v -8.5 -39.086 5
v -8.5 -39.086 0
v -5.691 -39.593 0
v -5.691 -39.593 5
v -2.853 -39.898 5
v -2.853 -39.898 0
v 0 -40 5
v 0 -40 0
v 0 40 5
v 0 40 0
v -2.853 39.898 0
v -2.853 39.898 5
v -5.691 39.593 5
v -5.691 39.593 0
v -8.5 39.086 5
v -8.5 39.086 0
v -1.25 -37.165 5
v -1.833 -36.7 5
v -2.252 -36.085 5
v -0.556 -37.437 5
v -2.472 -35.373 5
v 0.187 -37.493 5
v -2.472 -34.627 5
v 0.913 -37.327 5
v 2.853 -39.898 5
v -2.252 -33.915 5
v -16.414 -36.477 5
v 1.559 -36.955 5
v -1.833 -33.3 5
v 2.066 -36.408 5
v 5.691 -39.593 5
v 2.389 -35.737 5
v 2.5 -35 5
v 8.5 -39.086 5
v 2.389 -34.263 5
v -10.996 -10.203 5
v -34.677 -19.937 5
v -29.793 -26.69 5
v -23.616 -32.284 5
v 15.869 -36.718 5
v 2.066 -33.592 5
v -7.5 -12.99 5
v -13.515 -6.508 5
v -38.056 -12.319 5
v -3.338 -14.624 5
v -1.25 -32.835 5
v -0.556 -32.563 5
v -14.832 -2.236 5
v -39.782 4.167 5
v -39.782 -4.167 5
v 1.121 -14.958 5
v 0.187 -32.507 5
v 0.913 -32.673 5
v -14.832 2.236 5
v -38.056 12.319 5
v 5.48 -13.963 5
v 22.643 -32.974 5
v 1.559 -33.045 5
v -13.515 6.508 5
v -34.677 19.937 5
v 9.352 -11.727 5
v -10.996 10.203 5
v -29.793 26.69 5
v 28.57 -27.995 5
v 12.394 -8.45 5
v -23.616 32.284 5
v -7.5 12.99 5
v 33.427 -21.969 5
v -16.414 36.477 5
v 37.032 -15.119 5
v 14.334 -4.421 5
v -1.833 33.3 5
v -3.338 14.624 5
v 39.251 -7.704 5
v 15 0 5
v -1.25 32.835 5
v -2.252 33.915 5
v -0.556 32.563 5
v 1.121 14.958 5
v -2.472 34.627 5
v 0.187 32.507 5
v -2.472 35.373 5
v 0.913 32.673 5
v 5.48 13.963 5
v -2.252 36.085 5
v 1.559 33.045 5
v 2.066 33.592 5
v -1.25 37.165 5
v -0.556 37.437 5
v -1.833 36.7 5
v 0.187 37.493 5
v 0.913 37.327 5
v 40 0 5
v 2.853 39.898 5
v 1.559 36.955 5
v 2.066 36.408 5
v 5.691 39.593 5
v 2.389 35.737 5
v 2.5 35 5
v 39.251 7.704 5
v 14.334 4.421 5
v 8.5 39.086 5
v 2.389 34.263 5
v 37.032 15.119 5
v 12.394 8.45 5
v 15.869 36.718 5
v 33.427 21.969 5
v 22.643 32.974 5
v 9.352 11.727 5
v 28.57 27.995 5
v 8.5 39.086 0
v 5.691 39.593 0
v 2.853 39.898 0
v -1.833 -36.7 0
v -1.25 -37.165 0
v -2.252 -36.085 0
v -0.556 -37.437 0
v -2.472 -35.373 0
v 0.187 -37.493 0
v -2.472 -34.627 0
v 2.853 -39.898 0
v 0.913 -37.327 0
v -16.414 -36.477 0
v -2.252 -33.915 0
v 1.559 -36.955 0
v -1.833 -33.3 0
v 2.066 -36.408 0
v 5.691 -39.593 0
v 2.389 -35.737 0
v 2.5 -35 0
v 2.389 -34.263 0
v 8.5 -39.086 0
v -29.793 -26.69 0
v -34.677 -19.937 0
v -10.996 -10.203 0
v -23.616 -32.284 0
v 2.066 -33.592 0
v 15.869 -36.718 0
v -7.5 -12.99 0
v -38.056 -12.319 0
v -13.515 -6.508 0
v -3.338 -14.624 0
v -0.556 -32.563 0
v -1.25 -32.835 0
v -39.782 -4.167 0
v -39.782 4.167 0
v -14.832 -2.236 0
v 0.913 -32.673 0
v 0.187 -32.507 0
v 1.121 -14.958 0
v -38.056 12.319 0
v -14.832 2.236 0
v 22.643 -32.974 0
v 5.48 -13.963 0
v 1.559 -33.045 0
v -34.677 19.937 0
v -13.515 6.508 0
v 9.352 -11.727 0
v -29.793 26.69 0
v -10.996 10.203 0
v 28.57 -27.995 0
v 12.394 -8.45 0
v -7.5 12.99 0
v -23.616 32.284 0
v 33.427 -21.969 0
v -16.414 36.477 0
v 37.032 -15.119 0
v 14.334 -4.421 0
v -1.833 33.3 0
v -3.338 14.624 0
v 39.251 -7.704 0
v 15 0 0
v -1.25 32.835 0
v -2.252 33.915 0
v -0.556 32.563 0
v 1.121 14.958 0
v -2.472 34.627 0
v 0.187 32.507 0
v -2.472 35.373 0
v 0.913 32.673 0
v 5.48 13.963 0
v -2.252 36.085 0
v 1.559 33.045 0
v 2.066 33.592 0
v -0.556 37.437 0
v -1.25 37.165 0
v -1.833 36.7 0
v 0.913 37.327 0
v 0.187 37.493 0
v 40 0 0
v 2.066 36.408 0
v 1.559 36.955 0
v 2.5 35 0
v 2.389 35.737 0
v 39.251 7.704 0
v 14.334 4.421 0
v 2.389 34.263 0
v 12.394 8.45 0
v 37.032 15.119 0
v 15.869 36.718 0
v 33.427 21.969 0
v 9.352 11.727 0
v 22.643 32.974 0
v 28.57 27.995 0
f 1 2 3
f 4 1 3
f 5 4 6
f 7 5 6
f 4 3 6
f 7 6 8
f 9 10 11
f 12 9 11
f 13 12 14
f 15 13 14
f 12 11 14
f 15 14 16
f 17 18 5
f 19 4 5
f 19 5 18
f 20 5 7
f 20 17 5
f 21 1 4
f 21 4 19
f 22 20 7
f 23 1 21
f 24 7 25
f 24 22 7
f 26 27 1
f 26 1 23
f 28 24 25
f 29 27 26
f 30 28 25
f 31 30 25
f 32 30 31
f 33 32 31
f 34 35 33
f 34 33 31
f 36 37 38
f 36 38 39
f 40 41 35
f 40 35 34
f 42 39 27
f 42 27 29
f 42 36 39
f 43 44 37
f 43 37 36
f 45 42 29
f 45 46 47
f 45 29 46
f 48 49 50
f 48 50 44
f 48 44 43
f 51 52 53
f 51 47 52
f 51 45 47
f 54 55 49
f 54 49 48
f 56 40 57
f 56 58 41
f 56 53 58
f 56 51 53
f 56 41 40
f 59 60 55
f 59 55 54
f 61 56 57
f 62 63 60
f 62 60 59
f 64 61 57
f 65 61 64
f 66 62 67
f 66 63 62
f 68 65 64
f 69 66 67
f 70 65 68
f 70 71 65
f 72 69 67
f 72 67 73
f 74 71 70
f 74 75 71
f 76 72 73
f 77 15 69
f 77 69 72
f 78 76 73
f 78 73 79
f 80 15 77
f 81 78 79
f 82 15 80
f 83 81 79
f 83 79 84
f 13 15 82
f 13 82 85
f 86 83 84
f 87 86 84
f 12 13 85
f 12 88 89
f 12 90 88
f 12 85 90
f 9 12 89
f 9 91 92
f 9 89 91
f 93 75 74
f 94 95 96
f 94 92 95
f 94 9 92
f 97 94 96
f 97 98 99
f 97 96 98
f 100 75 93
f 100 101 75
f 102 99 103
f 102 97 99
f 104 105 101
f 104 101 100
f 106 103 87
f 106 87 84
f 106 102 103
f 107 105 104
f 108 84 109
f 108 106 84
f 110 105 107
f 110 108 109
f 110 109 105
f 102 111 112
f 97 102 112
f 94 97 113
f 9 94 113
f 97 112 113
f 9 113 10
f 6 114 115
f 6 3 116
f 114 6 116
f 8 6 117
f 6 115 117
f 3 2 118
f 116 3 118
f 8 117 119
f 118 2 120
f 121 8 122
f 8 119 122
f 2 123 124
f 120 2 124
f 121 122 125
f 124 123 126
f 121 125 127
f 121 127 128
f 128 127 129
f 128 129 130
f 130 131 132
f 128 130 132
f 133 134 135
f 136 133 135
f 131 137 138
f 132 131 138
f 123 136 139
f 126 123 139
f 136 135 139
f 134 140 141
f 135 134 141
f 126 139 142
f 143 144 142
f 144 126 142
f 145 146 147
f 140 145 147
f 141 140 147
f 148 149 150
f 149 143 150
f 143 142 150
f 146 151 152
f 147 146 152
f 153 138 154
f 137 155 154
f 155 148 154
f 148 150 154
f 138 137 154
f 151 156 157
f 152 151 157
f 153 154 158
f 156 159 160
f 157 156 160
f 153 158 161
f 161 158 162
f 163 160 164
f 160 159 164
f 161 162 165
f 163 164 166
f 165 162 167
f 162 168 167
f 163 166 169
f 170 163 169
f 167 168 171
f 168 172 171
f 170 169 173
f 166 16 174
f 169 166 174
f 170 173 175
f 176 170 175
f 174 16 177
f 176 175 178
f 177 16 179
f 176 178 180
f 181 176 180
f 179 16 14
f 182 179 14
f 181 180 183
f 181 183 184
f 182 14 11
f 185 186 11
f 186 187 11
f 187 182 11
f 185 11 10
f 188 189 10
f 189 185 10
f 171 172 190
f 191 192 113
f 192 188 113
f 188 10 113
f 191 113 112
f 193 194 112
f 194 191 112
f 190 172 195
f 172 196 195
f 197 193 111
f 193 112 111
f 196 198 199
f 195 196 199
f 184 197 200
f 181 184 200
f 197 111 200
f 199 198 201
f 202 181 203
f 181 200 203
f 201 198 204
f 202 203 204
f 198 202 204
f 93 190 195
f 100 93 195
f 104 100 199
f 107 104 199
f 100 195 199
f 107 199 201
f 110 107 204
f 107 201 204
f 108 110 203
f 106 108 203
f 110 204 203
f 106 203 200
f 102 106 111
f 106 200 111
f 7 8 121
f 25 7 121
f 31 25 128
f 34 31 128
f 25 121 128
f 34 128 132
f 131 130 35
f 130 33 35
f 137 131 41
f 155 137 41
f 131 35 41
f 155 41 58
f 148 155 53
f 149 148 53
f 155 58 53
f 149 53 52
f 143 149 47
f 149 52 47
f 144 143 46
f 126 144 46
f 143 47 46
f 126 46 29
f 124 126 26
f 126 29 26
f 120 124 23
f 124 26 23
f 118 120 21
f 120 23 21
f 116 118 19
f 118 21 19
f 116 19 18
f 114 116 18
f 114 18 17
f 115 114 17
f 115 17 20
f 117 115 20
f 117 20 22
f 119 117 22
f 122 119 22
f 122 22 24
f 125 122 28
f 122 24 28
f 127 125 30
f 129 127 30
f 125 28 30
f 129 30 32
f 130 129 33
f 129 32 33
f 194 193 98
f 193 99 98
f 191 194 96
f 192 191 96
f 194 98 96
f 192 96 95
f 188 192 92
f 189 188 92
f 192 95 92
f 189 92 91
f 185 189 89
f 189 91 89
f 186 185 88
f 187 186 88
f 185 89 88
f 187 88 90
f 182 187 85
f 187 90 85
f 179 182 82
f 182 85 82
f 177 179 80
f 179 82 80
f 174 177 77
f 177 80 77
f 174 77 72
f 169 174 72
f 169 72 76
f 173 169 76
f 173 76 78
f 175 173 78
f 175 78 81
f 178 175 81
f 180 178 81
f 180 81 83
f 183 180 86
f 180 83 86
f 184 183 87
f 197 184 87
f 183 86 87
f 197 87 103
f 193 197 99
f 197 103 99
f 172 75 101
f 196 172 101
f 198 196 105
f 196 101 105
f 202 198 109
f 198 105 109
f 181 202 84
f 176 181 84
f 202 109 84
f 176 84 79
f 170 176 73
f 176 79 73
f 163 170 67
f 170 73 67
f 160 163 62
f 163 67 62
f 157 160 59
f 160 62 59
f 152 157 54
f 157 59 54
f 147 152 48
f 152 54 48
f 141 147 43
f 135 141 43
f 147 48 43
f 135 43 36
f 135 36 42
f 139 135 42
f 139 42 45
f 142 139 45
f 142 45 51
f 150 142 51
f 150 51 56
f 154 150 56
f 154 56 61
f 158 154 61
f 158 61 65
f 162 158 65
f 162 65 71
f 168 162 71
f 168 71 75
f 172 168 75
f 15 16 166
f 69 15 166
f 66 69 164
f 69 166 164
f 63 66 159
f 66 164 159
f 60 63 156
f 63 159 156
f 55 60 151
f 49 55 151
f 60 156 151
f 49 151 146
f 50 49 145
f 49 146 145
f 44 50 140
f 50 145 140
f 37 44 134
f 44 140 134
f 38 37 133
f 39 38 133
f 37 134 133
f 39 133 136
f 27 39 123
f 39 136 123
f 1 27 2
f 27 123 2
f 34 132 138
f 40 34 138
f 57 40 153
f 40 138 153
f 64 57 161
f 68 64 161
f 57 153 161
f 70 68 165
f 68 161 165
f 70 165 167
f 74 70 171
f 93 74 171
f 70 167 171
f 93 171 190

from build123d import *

# Parameters (mm, degrees)
F1_DEPTH = 5
F2_R     = 2.5
F2_R_2   = 1.5
F3_DEPTH = 2
F4_R     = 15
F5_DEPTH = 25
F6_DEPTH = 25


with BuildPart() as f1:
    # F0 (on Top) → F1 (new body)
    with BuildSketch(Plane.XY):
        with BuildLine():
            Line((-8.5, 0), (-8.5, 39.0864426624))
            ThreePointArc((-8.5, 39.0864426624), (-40, 0), (-8.5, -39.0864426624))
            Line((-8.5, -39.0864426624), (-8.5, 0))
        make_face()
        with BuildLine():
            ThreePointArc((0, -40), (4.2744761962, -39.7709548948), (8.5, -39.0864426624))
            Line((8.5, -39.0864426624), (8.5, 0))
            Line((8.5, 0), (0, 0))
            Line((0, 0), (-8.5, 0))
            Line((-8.5, 0), (-8.5, -39.0864426624))
            ThreePointArc((-8.5, -39.0864426624), (-4.2744761962, -39.7709548948), (0, -40))
        make_face()
        with BuildLine():
            ThreePointArc((2.5, -35), (1.767766953, -36.767766953), (0, -37.5))
            ThreePointArc((0, -37.5), (-1.767766953, -33.232233047), (2.5, -35))
        make_face(mode=Mode.SUBTRACT)
        with BuildLine():
            Line((8.5, 0), (8.5, 39.0864426624))
            ThreePointArc((8.5, 39.0864426624), (4.2744761962, 39.7709548948), (0, 40))
            ThreePointArc((0, 40), (-4.2744761962, 39.7709548948), (-8.5, 39.0864426624))
            Line((-8.5, 39.0864426624), (-8.5, 0))
            Line((-8.5, 0), (0, 0))
            Line((0, 0), (8.5, 0))
        make_face()
        with BuildLine():
            ThreePointArc((2.5, 35), (-1.767766953, 33.232233047), (0, 37.5))
            ThreePointArc((0, 37.5), (1.767766953, 36.767766953), (2.5, 35))
        make_face(mode=Mode.SUBTRACT)
        with BuildLine():
            ThreePointArc((8.5, -39.0864426624), (31.1448230048, -25.099800796), (40, 0))
            ThreePointArc((40, 0), (31.1448230048, 25.099800796), (8.5, 39.0864426624))
            Line((8.5, 39.0864426624), (8.5, 0))
            Line((8.5, 0), (8.5, -39.0864426624))
        make_face()
        with BuildLine():
            ThreePointArc((2.5, 35), (1.767766953, 36.767766953), (0, 37.5))
            ThreePointArc((0, 37.5), (-1.767766953, 33.232233047), (2.5, 35))
        make_face()
        with BuildLine():
            ThreePointArc((1.5, 35), (-1.0606601718, 33.9393398282), (0, 36.5))
            ThreePointArc((0, 36.5), (1.0606601718, 36.0606601718), (1.5, 35))
        make_face(mode=Mode.SUBTRACT)
        with BuildLine():
            ThreePointArc((2.5, -35), (-1.767766953, -33.232233047), (0, -37.5))
            ThreePointArc((0, -37.5), (1.767766953, -36.767766953), (2.5, -35))
        make_face()
        with BuildLine():
            ThreePointArc((1.5, -35), (1.0606601718, -36.0606601718), (0, -36.5))
            ThreePointArc((0, -36.5), (-1.0606601718, -33.9393398282), (1.5, -35))
        make_face(mode=Mode.SUBTRACT)
    extrude(amount=F1_DEPTH)

    # F2 (on face) → F3 (cut)
    with BuildSketch(Plane.XY.offset(5)):
        with Locations((0, 35)):
            Circle(F2_R)
        with Locations((0, 35)):
            Circle(F2_R_2, mode=Mode.SUBTRACT)
        with Locations((0, -35)):
            Circle(F2_R)
        with Locations((0, -35)):
            Circle(F2_R_2, mode=Mode.SUBTRACT)
    extrude(amount=-F3_DEPTH, mode=Mode.SUBTRACT)

    # F4 (on face) → F5 (cut)
    with BuildSketch(Plane.XY.offset(5)):
        Circle(F4_R)
    extrude(amount=-F5_DEPTH, mode=Mode.SUBTRACT)

    # F6 (cut): faces of the model
    f6_faces = [f1.faces().sort_by_distance(p)[0] for p in [
        (-2.4292893219, 35, 3),
        (-2.4292893219, -35, 3),
    ]]
    extrude(f6_faces, amount=-F6_DEPTH, mode=Mode.SUBTRACT)


solid = f1.part
